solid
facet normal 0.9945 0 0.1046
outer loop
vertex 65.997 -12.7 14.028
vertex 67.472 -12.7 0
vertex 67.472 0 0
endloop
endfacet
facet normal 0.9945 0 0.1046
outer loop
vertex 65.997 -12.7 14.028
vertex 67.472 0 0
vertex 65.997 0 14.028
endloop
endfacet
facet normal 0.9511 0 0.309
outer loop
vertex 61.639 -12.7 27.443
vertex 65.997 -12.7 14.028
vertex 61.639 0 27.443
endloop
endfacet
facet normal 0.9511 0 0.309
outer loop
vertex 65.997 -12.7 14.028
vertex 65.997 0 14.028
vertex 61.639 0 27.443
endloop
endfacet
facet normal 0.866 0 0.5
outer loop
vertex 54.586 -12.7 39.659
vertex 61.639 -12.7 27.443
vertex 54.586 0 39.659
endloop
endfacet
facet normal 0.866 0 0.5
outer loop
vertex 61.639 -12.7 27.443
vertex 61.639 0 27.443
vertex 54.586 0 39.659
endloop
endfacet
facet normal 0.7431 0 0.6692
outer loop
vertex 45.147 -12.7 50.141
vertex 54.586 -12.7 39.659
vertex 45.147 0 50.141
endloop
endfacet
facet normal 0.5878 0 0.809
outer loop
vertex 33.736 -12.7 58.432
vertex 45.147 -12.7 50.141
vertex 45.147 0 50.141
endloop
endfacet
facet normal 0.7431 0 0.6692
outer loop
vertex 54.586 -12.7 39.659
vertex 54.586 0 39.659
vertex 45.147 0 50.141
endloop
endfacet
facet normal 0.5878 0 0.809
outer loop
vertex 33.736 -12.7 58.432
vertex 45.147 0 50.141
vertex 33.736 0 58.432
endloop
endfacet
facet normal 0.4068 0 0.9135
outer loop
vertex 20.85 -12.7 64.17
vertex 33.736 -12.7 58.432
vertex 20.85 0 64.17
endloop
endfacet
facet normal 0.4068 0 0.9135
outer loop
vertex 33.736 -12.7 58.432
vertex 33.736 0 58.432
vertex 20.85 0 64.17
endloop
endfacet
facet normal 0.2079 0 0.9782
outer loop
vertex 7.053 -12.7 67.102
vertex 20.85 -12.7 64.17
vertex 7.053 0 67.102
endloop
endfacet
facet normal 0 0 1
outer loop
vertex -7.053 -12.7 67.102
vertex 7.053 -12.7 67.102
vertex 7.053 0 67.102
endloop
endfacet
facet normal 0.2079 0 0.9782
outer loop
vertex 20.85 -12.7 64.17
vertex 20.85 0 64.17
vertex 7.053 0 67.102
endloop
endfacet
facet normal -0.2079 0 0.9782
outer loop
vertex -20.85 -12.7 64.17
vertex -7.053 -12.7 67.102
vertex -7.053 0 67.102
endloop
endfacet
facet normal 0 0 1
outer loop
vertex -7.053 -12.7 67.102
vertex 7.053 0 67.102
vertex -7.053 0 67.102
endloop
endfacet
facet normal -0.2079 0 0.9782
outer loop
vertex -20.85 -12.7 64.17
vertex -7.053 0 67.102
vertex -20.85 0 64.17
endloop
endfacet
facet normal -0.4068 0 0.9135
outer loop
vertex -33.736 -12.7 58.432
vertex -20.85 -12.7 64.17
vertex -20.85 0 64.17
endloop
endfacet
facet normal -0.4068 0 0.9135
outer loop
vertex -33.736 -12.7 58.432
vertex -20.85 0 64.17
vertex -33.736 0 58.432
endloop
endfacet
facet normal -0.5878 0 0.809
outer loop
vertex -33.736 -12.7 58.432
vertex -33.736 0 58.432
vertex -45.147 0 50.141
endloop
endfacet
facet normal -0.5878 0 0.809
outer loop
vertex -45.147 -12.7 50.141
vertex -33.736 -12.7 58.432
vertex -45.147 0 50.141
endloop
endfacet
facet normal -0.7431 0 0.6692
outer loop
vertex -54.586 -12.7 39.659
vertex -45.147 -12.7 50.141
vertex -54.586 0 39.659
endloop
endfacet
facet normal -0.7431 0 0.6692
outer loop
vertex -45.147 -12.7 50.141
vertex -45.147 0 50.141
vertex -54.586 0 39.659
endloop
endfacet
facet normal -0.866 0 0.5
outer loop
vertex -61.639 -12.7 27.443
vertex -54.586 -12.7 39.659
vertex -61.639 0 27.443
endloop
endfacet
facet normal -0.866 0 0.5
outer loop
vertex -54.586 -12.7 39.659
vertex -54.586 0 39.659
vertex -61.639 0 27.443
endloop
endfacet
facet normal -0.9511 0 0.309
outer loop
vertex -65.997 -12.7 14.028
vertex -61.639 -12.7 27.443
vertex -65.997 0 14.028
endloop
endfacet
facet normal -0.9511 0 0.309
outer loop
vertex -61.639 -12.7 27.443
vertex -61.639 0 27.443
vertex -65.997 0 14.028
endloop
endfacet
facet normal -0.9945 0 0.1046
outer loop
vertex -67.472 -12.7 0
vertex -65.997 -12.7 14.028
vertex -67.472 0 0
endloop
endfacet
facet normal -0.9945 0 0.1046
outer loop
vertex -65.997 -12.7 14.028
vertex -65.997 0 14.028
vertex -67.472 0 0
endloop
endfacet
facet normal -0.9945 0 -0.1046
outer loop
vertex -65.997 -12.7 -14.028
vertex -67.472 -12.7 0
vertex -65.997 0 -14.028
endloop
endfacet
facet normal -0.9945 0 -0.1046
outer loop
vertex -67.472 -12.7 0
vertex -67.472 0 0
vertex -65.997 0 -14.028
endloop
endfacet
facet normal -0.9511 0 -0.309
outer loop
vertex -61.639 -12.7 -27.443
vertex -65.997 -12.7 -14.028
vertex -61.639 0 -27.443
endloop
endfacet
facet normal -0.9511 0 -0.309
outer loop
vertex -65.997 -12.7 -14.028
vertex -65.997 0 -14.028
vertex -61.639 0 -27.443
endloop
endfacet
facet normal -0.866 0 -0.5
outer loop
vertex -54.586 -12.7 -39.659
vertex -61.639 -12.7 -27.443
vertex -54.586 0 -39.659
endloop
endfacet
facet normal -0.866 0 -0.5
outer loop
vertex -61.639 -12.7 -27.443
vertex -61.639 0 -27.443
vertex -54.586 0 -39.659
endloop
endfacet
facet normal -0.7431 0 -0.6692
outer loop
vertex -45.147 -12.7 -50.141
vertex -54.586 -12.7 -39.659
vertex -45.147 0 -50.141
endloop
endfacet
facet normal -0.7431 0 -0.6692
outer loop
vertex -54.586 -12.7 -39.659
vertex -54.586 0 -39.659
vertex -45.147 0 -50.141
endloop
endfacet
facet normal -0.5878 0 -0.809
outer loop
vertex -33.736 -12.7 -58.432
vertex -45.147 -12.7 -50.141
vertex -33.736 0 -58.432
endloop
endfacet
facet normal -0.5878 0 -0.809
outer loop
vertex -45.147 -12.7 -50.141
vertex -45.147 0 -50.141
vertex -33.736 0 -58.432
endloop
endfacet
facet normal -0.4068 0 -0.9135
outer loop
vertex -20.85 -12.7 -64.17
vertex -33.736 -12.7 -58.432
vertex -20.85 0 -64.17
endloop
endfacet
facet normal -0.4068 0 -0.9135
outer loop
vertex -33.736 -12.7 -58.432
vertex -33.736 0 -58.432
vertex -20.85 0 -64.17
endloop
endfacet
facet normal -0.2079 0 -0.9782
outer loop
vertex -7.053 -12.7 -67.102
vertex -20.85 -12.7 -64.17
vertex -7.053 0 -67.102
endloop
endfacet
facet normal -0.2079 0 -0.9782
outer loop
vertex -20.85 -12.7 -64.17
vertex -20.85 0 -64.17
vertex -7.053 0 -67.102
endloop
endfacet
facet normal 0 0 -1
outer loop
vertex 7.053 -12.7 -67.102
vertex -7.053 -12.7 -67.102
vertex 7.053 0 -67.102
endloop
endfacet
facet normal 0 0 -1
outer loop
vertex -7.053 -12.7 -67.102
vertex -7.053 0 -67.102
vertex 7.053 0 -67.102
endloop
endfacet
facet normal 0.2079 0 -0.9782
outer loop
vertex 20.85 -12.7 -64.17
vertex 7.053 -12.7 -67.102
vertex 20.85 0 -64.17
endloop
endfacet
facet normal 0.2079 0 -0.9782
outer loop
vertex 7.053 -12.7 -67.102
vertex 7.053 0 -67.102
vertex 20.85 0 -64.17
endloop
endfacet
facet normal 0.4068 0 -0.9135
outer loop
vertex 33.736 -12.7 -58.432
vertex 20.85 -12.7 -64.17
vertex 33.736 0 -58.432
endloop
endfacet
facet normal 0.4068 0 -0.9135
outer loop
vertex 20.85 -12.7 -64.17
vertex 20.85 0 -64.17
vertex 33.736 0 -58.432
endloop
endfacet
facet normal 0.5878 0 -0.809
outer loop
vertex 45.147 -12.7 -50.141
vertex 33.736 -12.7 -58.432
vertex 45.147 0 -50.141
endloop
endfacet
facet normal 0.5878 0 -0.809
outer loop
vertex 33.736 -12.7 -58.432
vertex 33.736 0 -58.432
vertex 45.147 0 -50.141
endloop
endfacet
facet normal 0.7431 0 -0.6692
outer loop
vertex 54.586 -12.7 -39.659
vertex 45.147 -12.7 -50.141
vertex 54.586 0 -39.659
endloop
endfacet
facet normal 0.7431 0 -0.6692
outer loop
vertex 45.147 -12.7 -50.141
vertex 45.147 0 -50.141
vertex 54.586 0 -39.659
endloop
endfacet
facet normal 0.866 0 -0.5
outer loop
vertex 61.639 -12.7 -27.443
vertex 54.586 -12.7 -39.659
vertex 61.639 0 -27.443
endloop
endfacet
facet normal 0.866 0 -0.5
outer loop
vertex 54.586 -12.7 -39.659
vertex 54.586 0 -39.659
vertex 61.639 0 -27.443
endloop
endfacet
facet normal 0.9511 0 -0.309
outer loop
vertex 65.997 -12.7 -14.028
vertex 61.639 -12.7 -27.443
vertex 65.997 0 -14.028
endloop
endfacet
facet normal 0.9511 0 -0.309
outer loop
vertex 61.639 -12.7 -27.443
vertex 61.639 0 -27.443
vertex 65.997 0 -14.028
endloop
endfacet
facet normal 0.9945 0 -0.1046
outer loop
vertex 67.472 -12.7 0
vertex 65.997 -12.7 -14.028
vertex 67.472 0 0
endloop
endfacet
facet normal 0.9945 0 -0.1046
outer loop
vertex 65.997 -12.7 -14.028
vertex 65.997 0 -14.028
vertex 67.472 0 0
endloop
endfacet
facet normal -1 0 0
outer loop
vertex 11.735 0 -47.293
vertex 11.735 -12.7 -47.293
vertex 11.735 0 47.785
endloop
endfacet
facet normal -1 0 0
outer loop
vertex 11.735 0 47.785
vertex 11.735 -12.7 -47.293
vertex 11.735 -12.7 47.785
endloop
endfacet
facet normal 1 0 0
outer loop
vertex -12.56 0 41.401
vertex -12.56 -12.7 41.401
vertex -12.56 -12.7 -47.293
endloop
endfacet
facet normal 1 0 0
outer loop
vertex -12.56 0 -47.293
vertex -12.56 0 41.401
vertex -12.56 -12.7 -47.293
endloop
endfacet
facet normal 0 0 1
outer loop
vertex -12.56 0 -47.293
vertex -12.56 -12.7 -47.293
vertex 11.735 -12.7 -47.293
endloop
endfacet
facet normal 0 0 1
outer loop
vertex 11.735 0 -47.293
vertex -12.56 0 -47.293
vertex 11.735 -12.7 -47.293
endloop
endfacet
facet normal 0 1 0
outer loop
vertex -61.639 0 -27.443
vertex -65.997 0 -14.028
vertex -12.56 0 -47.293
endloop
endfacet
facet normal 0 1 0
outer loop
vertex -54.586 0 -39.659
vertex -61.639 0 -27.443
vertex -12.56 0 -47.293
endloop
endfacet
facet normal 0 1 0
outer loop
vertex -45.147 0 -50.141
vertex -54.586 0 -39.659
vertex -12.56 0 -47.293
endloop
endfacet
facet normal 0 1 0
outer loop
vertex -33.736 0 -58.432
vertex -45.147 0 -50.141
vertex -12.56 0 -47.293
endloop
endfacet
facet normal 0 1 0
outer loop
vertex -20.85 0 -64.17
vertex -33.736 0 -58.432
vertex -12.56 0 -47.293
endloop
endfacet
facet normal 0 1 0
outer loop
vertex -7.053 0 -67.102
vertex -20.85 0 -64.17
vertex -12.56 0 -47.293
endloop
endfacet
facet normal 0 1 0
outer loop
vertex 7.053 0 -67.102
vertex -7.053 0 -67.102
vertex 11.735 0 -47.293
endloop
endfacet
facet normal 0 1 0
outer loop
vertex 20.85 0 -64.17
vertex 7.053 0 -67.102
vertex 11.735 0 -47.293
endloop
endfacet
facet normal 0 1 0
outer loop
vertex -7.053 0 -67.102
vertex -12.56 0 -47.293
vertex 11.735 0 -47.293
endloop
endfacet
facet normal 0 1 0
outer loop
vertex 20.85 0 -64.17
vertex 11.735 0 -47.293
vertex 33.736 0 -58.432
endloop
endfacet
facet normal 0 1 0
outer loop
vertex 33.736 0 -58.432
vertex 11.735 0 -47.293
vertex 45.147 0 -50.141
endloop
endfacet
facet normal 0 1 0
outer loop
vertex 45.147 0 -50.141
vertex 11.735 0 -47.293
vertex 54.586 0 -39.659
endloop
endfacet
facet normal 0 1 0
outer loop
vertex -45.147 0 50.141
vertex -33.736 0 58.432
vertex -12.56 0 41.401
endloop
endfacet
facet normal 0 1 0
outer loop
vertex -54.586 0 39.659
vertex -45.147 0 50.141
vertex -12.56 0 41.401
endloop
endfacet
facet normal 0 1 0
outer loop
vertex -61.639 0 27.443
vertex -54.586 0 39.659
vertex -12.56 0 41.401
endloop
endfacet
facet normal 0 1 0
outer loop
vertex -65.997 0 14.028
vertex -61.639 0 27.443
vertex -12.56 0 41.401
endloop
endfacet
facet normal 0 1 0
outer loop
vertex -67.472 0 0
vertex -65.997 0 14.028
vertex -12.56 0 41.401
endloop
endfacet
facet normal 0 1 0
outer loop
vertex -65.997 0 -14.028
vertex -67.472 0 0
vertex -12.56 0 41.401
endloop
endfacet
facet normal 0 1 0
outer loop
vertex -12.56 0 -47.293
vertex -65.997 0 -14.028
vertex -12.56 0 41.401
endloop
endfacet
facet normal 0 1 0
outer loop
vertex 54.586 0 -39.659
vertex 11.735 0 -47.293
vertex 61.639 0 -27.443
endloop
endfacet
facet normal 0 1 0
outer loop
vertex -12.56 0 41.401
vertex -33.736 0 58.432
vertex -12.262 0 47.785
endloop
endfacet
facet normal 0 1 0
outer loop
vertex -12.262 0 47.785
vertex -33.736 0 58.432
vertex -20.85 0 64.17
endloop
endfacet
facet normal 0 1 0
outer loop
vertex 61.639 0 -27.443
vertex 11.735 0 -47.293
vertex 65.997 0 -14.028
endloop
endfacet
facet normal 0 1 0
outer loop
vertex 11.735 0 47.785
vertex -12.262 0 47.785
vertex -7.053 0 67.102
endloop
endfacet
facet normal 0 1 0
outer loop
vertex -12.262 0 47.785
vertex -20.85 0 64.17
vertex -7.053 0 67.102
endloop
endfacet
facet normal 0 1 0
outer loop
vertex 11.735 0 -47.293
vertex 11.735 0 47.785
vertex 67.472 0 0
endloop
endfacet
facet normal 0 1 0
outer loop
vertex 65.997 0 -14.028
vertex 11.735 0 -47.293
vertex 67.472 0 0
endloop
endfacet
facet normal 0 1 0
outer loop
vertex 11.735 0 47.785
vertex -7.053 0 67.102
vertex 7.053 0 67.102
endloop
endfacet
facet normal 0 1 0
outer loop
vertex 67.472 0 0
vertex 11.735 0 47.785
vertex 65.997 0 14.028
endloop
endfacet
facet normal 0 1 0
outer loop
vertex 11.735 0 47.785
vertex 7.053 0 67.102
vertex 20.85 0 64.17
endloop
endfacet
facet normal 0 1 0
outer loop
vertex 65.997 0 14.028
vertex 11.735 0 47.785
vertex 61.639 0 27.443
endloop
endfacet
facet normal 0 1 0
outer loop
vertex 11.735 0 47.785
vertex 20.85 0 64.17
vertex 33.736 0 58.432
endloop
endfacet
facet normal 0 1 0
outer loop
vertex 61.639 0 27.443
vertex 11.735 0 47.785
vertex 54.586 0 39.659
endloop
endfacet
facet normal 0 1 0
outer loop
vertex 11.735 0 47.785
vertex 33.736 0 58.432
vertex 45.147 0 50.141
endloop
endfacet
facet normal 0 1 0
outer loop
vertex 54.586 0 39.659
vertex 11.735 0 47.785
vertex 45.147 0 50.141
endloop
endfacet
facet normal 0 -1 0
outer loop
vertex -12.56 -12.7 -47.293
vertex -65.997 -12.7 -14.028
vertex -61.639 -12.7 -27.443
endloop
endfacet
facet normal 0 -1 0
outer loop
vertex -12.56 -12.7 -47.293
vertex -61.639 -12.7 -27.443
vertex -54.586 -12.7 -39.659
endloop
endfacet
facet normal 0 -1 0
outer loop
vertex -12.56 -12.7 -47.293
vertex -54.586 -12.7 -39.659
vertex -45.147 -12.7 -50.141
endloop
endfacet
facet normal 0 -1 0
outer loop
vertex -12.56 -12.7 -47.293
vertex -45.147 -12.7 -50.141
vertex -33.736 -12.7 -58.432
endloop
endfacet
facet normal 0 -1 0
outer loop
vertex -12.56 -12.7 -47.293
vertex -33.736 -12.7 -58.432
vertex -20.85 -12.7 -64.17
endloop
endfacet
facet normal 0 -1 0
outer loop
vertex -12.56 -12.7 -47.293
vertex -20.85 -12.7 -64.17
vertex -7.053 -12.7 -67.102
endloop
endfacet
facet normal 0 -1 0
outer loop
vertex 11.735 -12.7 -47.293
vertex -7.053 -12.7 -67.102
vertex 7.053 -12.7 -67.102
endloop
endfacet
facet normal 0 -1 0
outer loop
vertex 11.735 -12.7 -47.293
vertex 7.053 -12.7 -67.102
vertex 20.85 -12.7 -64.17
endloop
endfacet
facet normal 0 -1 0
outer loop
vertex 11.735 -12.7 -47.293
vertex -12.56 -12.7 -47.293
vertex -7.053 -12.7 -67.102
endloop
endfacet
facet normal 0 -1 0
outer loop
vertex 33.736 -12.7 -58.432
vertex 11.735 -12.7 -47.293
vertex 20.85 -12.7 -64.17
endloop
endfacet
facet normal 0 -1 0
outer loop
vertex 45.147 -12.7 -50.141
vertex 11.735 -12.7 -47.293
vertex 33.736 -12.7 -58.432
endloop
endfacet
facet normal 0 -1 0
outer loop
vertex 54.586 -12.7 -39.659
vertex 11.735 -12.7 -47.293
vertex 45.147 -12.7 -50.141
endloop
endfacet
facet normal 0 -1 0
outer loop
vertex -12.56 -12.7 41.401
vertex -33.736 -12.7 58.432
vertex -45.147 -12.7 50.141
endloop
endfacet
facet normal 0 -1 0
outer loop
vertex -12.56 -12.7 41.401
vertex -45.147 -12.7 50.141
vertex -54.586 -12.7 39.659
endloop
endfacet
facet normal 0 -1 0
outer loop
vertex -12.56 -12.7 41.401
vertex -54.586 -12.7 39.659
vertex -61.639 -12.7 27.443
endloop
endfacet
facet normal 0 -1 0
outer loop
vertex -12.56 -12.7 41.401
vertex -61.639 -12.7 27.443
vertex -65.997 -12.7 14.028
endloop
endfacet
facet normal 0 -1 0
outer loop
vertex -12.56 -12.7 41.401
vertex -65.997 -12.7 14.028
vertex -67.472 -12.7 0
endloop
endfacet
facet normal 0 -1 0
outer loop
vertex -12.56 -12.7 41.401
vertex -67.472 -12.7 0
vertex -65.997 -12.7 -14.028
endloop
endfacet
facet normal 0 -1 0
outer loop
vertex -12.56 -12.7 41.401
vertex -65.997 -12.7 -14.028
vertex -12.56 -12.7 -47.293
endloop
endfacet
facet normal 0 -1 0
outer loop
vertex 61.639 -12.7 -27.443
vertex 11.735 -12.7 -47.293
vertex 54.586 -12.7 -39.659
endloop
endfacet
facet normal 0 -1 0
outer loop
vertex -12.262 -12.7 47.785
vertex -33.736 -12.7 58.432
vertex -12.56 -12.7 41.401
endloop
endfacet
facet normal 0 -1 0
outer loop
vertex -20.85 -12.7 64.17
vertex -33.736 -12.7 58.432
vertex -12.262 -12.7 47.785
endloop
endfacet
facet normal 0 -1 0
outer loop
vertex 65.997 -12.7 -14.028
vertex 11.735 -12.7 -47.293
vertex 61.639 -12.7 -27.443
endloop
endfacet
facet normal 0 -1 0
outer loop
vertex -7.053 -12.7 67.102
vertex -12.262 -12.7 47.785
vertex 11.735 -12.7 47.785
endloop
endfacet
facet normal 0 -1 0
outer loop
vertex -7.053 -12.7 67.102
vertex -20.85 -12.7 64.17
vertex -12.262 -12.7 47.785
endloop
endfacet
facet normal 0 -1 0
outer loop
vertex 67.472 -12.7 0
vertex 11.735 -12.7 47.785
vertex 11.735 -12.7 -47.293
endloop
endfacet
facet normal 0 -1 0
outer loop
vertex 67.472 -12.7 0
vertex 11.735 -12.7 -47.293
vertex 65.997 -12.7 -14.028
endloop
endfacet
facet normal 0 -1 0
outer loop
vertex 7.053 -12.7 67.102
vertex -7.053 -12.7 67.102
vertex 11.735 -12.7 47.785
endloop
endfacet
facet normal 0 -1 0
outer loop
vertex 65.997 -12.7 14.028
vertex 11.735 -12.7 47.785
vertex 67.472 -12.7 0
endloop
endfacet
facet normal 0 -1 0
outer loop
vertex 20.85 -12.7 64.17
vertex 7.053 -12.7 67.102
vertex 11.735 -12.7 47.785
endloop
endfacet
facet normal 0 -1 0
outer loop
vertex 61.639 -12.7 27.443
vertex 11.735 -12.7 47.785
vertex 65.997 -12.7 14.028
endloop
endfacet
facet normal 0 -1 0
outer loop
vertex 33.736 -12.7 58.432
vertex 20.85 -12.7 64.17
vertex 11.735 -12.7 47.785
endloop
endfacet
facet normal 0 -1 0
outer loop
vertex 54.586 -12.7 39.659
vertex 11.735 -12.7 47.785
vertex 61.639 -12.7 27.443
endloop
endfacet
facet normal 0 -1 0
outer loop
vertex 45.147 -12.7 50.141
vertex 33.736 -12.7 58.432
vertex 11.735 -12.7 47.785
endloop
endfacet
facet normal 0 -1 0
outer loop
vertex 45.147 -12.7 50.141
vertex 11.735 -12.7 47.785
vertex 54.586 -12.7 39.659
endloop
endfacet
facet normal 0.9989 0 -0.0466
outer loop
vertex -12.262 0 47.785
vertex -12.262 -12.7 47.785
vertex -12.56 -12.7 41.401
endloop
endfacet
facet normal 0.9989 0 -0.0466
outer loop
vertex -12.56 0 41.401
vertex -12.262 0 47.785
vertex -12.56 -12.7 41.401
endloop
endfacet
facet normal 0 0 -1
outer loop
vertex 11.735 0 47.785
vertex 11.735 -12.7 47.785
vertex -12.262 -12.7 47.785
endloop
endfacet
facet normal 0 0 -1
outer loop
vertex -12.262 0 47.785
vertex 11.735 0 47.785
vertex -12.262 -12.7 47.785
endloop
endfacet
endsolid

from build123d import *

# Parameters (mm, degrees)
F0_R     = 67.471855
F1_DEPTH = 12.7
F3_DEPTH = 12.7


with BuildPart() as f1:
    # F0 (on Front) → F1 (new body)
    with BuildSketch(Plane.XZ):
        Circle(F0_R)
    extrude(amount=F1_DEPTH)

    # F2 (on face) → F3 (cut)
    with BuildSketch(Plane.XZ.offset(12.7)):
        Polygon((-12.2623, 47.785219), (-12.55971, 41.400526), (-12.55971, -47.292732), (11.735013, -47.292732), (11.735013, 47.785219), align=None)
    extrude(amount=-F3_DEPTH, mode=Mode.SUBTRACT)


solid = f1.part
